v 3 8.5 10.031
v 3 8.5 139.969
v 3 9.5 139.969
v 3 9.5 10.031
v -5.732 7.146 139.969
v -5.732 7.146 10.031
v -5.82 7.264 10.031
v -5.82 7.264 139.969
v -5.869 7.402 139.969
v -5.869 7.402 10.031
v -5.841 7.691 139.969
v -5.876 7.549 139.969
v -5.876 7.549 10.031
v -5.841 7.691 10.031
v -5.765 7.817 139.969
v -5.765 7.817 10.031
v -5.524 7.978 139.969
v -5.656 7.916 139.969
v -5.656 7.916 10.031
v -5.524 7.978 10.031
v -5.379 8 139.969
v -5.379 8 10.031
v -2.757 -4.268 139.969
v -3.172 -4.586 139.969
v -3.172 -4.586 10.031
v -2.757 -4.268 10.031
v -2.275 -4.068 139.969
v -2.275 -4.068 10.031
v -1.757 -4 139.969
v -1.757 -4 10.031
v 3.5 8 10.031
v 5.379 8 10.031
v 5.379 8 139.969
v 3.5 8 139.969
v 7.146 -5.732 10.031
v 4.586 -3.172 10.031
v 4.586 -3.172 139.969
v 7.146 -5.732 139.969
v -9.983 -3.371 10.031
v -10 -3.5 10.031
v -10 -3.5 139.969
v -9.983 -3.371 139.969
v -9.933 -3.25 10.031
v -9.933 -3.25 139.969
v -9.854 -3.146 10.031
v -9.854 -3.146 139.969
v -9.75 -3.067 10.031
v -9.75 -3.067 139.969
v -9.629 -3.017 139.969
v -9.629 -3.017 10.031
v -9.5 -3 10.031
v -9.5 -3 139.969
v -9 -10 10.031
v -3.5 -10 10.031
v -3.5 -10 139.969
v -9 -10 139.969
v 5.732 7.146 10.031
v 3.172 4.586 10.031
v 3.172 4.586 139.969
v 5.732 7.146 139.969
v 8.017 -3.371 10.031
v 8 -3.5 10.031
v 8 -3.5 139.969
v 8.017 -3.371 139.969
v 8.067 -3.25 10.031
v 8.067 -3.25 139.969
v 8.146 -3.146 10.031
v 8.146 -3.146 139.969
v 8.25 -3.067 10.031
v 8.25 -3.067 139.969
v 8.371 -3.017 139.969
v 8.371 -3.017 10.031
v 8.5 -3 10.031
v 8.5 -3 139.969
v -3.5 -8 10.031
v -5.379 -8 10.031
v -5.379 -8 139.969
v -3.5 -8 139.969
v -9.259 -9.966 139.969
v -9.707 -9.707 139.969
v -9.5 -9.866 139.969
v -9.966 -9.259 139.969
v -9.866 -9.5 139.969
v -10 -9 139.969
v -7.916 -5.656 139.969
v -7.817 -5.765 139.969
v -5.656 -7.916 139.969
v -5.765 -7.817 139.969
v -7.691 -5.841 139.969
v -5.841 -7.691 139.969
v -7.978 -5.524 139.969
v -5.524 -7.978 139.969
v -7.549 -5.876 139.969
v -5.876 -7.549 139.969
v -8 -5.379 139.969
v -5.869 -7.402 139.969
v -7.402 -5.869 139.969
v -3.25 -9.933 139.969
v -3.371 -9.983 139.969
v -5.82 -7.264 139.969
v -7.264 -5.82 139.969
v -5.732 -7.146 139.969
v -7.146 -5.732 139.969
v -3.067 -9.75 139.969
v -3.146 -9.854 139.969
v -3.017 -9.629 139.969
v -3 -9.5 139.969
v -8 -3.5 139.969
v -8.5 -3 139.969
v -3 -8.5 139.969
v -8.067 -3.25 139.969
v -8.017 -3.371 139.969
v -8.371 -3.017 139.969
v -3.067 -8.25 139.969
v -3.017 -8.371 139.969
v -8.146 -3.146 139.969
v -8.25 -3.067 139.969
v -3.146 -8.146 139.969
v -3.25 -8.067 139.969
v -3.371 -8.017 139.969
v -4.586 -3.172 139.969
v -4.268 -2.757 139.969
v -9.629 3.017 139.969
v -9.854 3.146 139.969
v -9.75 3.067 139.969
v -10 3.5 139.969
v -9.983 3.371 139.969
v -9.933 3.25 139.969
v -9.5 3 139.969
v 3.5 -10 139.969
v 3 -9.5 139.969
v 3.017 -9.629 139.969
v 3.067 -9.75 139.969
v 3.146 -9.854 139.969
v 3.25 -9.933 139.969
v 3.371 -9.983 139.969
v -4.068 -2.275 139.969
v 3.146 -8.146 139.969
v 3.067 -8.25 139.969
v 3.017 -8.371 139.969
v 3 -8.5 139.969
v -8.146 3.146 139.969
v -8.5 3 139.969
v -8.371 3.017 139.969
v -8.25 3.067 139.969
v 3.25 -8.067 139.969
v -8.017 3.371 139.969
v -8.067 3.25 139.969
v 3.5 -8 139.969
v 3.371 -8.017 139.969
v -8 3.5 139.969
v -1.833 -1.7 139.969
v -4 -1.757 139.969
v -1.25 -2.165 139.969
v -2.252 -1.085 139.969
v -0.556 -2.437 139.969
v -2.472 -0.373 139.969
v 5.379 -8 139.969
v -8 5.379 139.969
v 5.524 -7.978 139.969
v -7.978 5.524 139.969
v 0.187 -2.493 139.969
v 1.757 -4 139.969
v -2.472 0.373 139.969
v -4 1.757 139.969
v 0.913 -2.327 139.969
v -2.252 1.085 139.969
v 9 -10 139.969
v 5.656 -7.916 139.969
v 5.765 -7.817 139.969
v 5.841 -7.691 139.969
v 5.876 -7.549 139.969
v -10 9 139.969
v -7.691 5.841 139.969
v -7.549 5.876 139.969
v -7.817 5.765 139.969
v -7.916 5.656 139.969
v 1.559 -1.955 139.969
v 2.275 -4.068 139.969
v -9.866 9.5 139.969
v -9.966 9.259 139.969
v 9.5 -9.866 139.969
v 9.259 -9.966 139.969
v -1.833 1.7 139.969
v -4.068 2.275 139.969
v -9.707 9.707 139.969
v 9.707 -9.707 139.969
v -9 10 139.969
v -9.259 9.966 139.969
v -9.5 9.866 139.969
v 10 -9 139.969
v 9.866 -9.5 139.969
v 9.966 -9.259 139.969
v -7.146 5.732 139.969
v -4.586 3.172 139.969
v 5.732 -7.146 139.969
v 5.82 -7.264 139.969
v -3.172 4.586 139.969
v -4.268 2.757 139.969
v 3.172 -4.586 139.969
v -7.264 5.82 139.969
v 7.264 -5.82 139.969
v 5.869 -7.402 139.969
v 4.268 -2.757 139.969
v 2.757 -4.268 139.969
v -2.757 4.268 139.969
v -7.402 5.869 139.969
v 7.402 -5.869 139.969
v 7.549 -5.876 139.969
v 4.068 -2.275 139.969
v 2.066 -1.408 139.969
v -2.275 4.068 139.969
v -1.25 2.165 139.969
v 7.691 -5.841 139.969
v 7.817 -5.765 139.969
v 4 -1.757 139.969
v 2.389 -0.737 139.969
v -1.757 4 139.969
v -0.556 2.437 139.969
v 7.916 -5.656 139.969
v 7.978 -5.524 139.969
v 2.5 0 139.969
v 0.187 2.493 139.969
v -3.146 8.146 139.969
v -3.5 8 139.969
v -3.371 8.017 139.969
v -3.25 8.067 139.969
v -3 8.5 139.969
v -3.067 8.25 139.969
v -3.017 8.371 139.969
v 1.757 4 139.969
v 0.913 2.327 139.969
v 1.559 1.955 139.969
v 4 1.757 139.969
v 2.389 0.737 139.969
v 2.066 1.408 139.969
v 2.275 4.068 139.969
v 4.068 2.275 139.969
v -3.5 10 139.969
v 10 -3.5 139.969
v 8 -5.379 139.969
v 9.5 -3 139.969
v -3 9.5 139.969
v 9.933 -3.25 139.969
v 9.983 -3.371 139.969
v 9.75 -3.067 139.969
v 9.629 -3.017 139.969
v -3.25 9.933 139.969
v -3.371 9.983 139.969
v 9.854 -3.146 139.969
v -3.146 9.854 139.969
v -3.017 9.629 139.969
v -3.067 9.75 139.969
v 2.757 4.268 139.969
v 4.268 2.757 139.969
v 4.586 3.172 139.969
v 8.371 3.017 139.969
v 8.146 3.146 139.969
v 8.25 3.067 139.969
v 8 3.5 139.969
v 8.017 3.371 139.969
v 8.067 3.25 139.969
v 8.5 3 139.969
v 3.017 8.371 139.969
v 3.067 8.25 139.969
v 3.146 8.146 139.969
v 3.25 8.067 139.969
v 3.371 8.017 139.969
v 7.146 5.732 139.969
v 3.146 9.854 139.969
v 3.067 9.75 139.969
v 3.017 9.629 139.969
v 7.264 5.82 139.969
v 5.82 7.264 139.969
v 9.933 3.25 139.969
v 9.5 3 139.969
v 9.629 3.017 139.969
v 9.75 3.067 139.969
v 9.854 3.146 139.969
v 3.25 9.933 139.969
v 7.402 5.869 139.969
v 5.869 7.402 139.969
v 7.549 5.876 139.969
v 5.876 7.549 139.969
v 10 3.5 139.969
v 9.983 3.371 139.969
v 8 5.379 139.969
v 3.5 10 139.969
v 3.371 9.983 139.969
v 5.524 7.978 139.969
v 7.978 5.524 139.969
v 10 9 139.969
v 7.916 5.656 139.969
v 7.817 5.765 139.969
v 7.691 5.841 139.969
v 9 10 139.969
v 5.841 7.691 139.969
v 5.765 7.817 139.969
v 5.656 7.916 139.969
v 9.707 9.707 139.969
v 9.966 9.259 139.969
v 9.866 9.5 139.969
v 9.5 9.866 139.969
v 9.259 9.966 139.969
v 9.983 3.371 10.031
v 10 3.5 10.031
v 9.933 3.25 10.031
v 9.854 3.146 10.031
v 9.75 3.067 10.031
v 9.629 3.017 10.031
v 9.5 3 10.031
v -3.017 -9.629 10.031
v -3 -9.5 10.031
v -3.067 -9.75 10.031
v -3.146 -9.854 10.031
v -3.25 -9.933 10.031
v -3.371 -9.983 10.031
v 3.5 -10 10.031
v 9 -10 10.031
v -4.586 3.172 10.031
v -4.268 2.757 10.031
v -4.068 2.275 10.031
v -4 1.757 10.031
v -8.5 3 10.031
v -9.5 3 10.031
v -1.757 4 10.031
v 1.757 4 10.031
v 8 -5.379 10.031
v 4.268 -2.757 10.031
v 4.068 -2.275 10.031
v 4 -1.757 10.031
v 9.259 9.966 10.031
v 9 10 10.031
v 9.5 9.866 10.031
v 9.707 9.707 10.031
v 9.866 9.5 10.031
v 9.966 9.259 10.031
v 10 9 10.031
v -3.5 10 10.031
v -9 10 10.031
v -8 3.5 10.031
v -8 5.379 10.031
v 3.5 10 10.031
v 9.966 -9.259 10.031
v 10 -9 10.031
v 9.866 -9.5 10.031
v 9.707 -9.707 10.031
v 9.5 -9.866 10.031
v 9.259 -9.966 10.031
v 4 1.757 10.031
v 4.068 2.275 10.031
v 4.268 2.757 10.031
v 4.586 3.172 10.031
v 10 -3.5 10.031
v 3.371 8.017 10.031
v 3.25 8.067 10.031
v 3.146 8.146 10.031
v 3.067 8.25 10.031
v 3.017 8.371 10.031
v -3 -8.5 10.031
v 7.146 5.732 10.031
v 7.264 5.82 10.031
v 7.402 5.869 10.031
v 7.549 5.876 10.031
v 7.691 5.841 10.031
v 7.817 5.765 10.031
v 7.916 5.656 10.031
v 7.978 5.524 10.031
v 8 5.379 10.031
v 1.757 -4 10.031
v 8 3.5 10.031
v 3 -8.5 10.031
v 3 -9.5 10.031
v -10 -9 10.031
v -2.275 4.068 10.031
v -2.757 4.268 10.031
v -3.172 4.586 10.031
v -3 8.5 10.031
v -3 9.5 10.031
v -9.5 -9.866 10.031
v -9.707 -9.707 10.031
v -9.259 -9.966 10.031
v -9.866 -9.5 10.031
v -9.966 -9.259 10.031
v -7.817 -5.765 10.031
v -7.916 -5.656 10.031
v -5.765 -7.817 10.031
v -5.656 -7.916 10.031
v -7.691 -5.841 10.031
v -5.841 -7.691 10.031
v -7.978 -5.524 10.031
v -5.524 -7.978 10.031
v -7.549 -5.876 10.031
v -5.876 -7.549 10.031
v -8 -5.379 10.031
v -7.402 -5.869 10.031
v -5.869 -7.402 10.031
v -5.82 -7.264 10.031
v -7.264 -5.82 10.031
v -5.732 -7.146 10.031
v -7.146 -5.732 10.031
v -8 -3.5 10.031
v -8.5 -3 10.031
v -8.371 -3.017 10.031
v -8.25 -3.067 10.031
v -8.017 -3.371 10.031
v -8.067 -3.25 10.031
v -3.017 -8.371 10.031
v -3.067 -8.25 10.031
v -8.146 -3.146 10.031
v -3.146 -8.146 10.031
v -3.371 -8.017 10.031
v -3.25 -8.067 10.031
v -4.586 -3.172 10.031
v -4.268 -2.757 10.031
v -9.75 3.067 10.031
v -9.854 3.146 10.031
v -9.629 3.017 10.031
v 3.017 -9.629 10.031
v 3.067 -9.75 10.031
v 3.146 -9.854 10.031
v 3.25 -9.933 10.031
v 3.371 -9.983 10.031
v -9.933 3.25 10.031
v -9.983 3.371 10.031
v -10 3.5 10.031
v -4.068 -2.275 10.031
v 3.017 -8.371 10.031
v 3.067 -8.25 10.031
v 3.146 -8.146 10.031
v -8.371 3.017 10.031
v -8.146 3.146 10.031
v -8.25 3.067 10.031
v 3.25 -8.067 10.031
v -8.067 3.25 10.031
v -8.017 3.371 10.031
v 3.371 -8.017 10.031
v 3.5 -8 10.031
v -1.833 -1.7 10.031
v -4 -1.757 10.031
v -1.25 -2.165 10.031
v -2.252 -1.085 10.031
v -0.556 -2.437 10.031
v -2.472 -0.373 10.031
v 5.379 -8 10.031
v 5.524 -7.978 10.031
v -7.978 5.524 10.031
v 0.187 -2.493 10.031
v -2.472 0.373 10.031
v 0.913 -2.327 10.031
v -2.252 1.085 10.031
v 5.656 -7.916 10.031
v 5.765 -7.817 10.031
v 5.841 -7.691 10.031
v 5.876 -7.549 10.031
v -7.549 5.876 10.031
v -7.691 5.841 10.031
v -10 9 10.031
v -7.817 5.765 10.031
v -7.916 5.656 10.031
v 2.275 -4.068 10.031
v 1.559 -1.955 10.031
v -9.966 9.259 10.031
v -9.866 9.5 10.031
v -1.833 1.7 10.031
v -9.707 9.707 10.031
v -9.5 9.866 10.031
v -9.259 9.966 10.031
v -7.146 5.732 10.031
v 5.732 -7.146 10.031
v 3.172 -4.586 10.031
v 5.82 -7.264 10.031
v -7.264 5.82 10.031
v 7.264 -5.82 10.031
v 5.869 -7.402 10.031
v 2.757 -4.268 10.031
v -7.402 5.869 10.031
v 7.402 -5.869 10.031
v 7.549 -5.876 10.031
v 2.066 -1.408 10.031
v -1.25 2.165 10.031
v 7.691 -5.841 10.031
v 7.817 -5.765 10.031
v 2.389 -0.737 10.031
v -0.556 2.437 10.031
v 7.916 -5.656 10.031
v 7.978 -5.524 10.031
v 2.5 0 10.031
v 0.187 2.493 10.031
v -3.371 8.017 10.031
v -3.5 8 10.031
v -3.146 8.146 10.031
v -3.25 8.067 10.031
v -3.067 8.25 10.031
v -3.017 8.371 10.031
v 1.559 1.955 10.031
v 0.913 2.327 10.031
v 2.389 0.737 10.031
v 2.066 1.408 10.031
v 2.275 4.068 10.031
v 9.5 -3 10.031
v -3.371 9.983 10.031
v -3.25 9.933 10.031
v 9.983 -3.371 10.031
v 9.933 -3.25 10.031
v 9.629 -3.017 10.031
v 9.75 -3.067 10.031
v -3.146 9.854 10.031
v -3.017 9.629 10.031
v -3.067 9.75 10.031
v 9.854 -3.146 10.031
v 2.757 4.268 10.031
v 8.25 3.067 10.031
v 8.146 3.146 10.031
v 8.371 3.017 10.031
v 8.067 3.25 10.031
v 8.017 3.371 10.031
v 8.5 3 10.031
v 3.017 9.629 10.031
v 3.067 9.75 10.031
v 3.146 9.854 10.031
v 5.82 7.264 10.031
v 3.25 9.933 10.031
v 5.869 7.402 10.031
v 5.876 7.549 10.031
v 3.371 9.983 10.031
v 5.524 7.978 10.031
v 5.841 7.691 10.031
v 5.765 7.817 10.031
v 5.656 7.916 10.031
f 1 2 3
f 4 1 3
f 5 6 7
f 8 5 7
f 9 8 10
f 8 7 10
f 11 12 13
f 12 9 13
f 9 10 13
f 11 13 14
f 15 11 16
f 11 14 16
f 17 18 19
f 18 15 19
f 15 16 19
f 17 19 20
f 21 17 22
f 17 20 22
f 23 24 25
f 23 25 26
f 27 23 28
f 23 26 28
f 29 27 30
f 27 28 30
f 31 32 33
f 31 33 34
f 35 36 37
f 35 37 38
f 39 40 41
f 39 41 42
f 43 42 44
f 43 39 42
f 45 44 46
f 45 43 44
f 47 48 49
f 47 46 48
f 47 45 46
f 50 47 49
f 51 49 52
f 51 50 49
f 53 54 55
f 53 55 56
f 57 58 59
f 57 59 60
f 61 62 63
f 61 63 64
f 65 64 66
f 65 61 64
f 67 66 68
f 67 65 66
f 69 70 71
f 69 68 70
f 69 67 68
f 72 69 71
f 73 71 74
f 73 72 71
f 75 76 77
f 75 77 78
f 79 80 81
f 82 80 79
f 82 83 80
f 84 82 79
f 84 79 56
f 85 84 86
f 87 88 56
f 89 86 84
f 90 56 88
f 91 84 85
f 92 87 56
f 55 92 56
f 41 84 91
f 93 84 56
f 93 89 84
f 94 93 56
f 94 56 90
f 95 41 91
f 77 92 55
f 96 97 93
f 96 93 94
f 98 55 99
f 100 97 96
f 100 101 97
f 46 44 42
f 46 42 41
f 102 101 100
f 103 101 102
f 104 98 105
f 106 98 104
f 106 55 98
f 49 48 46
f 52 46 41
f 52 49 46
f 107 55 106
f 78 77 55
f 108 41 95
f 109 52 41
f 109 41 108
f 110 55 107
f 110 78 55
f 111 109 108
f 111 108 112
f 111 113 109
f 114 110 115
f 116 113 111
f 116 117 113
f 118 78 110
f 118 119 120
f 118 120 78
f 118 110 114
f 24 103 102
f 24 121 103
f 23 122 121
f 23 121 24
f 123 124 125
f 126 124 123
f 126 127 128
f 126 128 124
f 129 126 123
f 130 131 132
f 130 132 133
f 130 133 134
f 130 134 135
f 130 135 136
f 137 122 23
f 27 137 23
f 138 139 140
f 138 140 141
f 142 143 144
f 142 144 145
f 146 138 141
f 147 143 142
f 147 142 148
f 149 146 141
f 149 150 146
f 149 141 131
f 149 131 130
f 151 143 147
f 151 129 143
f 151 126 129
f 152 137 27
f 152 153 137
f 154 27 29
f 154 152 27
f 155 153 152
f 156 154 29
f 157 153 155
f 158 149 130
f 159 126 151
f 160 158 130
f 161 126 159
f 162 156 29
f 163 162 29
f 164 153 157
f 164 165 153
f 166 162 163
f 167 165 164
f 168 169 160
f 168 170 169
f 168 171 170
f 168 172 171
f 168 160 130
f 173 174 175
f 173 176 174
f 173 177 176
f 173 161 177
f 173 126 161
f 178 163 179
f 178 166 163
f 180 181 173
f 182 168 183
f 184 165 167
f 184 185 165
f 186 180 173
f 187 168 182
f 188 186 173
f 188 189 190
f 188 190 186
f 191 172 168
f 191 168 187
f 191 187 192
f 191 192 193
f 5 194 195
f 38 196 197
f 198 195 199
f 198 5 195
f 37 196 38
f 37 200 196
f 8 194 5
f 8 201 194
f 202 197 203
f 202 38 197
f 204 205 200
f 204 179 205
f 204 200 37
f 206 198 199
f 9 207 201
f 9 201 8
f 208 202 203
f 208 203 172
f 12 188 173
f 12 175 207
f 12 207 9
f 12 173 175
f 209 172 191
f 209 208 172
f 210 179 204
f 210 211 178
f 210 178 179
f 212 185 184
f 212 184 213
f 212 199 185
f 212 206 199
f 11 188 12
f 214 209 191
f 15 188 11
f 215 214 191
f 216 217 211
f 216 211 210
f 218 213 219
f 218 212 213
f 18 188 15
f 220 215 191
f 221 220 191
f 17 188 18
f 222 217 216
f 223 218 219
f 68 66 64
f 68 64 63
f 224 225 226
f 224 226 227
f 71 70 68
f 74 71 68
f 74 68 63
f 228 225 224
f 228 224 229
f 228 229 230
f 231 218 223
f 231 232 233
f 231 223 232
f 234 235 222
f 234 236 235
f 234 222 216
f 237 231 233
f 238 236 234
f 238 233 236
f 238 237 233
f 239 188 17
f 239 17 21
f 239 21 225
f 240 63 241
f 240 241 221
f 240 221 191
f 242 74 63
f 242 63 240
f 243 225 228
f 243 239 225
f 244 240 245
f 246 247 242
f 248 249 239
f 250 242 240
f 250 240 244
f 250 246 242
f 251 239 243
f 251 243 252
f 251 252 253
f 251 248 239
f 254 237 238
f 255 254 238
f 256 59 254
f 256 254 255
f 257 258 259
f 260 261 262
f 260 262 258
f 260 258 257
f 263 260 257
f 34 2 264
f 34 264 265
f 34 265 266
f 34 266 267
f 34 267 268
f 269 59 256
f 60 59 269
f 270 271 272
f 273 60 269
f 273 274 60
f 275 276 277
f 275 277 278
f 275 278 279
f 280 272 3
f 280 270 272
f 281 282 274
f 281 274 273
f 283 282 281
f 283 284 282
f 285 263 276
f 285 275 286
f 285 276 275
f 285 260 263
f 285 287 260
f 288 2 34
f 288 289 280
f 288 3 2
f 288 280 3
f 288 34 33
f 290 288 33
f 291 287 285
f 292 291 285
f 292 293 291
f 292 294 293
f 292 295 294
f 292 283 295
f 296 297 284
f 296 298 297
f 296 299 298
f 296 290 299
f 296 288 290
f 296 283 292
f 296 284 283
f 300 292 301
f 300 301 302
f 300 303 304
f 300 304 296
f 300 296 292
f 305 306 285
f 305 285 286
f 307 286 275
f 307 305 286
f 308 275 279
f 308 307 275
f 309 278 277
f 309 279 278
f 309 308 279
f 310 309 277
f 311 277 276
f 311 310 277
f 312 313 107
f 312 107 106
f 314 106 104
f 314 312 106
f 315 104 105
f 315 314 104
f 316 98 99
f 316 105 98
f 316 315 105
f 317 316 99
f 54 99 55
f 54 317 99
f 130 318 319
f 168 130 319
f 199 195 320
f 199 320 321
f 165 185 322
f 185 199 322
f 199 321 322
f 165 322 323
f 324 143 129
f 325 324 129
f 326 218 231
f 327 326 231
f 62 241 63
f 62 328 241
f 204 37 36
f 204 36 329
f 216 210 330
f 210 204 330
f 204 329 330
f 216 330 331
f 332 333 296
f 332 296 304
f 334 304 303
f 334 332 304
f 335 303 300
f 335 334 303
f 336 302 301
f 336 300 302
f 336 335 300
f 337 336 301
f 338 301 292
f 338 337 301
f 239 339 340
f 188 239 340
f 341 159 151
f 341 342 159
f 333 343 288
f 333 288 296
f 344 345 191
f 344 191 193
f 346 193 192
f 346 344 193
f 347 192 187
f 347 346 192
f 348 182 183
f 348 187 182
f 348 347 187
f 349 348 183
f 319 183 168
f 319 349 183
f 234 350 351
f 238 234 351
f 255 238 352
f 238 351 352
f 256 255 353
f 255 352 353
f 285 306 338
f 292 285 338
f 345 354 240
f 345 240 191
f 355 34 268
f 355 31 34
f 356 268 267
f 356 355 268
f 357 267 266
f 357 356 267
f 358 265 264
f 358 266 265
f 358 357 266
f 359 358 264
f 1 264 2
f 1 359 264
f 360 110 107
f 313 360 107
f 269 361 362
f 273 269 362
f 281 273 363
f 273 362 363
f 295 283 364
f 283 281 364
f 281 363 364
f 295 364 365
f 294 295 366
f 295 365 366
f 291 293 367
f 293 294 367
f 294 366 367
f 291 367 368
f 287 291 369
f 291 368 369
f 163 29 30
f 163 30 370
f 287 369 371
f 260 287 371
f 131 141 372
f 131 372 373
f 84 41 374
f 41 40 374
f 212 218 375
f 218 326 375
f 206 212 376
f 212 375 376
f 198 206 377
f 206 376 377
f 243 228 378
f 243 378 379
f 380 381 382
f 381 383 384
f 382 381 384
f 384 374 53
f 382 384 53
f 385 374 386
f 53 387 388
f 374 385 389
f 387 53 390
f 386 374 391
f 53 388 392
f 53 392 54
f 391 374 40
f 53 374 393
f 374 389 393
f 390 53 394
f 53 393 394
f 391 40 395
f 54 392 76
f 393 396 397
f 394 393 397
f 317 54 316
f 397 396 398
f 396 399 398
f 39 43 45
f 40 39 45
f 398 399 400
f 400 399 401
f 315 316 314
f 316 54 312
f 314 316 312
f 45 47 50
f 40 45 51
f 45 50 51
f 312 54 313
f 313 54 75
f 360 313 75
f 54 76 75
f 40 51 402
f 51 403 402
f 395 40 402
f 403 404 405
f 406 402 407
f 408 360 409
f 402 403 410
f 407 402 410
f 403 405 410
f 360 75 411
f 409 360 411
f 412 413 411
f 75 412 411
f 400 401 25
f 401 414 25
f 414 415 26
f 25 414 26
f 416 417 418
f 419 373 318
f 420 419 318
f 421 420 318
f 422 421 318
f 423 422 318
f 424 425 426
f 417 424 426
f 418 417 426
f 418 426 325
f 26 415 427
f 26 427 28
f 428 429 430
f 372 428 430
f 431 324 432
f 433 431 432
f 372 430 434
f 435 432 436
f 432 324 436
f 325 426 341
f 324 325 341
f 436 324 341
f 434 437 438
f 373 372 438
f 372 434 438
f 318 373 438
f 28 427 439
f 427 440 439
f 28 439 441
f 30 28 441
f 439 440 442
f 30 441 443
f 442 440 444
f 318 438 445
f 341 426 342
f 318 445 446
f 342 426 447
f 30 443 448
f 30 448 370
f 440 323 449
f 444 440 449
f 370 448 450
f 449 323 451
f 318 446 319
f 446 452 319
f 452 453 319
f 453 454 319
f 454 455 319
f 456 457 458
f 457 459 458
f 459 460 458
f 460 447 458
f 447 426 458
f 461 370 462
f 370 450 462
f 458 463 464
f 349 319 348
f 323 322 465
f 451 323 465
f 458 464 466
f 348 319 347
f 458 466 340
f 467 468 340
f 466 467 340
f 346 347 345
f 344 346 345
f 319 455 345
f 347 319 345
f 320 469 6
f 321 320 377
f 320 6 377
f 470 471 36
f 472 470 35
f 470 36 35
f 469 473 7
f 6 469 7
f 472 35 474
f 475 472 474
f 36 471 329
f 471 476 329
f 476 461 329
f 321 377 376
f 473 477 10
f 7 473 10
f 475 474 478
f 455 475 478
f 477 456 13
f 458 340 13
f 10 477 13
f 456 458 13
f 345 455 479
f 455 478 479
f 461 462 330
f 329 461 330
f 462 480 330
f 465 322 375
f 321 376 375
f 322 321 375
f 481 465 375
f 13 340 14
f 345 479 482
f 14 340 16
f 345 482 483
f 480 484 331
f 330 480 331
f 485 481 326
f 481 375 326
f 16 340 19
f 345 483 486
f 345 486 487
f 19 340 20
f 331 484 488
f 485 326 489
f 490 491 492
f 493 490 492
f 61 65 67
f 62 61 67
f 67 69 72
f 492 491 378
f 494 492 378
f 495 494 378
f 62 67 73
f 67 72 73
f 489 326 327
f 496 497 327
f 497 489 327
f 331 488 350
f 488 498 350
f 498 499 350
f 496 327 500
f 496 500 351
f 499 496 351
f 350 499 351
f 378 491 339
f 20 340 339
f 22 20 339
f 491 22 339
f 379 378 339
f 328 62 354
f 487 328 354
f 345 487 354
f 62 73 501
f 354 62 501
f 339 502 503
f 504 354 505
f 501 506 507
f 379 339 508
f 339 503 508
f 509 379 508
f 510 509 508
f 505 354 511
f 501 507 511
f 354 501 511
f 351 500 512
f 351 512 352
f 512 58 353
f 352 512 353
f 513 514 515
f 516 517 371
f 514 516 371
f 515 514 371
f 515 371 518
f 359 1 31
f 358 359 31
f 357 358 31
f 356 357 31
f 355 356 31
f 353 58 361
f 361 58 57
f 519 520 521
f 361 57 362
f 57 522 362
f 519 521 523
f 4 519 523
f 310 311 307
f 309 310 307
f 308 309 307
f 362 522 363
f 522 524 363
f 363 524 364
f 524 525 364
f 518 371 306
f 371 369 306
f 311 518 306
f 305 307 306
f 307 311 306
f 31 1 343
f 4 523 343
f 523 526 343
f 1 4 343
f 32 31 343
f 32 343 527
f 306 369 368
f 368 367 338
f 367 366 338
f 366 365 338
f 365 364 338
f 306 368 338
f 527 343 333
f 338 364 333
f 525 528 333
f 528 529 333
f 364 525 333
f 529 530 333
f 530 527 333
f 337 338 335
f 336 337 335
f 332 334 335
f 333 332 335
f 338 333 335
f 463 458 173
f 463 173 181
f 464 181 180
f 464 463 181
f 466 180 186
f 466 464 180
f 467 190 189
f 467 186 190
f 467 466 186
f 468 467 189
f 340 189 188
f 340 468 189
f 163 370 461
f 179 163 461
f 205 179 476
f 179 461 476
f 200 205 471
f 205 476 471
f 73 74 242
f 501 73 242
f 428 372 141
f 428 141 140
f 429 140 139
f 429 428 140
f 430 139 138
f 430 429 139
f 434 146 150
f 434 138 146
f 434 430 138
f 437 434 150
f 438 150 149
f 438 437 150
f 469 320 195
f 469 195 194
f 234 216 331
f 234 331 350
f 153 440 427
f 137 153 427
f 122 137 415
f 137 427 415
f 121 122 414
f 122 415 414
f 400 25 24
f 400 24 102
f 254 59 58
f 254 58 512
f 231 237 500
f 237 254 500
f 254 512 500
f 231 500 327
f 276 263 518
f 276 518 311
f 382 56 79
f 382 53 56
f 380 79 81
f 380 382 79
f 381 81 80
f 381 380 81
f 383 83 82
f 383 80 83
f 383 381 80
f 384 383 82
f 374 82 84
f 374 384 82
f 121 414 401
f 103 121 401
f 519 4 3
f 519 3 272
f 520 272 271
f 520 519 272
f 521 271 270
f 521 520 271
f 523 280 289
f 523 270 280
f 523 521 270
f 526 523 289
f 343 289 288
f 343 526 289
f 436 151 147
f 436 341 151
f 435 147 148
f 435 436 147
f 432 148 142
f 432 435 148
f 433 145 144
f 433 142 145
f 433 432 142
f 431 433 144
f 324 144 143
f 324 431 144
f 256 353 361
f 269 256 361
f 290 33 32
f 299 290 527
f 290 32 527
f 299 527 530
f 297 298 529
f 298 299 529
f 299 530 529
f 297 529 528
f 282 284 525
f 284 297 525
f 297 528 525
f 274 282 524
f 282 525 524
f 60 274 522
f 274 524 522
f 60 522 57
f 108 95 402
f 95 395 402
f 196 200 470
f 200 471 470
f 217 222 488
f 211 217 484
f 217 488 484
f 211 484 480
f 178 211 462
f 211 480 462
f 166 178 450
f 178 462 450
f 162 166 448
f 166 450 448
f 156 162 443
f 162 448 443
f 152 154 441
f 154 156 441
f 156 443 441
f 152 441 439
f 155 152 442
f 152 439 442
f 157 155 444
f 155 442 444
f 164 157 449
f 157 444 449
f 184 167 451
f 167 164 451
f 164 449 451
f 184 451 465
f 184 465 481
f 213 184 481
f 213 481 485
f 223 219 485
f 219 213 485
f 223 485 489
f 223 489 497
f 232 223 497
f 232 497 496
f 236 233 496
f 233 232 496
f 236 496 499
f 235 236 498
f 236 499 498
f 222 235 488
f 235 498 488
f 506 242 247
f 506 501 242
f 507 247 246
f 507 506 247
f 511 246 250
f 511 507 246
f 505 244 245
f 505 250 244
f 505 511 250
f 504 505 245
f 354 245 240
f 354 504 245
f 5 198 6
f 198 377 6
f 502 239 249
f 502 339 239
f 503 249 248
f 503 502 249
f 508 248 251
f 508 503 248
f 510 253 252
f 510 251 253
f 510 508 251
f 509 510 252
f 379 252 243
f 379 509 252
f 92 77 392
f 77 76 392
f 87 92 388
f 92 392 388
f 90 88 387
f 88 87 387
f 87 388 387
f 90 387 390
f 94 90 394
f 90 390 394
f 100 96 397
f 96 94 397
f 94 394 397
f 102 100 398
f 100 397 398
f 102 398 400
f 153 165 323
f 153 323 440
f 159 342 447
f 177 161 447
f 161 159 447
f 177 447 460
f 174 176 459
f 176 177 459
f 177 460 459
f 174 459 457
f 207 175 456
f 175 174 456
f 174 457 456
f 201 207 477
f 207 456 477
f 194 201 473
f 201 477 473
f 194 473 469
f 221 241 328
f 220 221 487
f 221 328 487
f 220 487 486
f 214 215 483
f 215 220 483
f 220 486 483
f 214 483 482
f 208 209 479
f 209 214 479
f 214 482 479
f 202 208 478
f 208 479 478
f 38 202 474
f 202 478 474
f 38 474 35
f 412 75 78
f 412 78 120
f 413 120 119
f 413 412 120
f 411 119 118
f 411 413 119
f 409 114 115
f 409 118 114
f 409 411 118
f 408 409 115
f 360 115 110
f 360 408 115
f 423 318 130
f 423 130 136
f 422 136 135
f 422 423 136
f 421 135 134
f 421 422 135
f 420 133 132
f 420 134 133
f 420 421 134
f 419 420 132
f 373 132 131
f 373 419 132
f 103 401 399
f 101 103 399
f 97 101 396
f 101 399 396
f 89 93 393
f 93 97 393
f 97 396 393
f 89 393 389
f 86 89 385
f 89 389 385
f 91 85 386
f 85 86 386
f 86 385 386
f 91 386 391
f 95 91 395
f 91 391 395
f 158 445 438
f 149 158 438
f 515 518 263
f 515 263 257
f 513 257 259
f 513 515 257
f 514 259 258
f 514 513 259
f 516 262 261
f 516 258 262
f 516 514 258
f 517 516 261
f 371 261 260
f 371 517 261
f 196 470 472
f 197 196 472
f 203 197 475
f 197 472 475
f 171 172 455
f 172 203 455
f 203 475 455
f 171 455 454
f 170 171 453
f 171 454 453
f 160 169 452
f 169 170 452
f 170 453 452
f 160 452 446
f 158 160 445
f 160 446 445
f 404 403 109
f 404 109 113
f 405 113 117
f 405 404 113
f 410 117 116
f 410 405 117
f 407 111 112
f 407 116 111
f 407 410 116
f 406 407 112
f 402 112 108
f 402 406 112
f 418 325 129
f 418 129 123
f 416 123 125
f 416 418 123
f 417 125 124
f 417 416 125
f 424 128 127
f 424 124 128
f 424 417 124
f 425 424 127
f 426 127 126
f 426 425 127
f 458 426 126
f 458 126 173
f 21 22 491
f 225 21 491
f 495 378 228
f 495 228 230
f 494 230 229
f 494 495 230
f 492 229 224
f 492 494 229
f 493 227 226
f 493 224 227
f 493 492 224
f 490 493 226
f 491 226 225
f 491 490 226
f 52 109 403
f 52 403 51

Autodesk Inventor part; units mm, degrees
ref_plane "Start Plane" through (0, 0, 10.031) normal (0, 0, 1) x (1, 0, 0)
ref_plane "End Plane" through (0, 0, 139.969) normal (0, 0, 1) x (1, 0, 0)
sketch "Sketch" plane through (0, 0, 0) normal (0, 0, 1) x (1, 0, 0)
  line L0 (0, 0) -> (2.5, 0) construction
  line L1 (0, 0) -> (0, 2.5) construction
  line L2 (0, 4) -> (0, -4) construction
  line L3 (0, 4) -> (1.7574, 4)
  arc A0 (1.7574, 4) -> (3.1716, 4.5858) centre (1.7574, 6) ccw
  line L4 (3.1716, 4.5858) -> (5.7322, 7.1464)
  line L5 (-4, 0) -> (4, 0) construction
  line L6 (4, 0) -> (4, 1.7574)
  arc A1 (4.5858, 3.1716) -> (4, 1.7574) centre (6, 1.7574) ccw
  line L7 (4.5858, 3.1716) -> (7.1464, 5.7322)
  line L8 (0, 0) -> (10, 10) construction
  line L9 (0, 0) -> (19.6827, 0) construction
  arc A2 (8, 5.3787) -> (7.1464, 5.7322) centre (7.5, 5.3787) ccw
  line L10 (8, 5.3787) -> (8, 3.5)
  arc A3 (8, 3.5) -> (8.5, 3) centre (8.5, 3.5) ccw
  line L11 (8.5, 3) -> (9.5, 3)
  arc A4 (9.5, 3) -> (10, 3.5) centre (9.5, 3.5) ccw
  line L12 (10, 3.5) -> (10, 9)
  line L13 (10, 9) -> (10, 10) construction
  arc A5 (5.7322, 7.1464) -> (5.3787, 8) centre (5.3787, 7.5) ccw
  line L14 (5.3787, 8) -> (3.5, 8)
  arc A6 (3, 8.5) -> (3.5, 8) centre (3.5, 8.5) ccw
  line L15 (3, 8.5) -> (3, 9.5)
  arc A7 (3.5, 10) -> (3, 9.5) centre (3.5, 9.5) ccw
  line L16 (3.5, 10) -> (9, 10)
  arc A8 (10, 9) -> (9, 10) centre (9, 9) ccw
  line L17 (0, 4) -> (-1.7574, 4)
  arc A9 (-3.1716, 4.5858) -> (-1.7574, 4) centre (-1.7574, 6) ccw
  line L18 (-3.1716, 4.5858) -> (-5.7322, 7.1464)
  line L19 (-4, 0) -> (-4, 1.7574)
  arc A10 (-4, 1.7574) -> (-4.5858, 3.1716) centre (-6, 1.7574) ccw
  line L20 (-4.5858, 3.1716) -> (-7.1464, 5.7322)
  arc A11 (-7.1464, 5.7322) -> (-8, 5.3787) centre (-7.5, 5.3787) ccw
  line L21 (-8, 5.3787) -> (-8, 3.5)
  arc A12 (-8.5, 3) -> (-8, 3.5) centre (-8.5, 3.5) ccw
  line L22 (-8.5, 3) -> (-9.5, 3)
  arc A13 (-10, 3.5) -> (-9.5, 3) centre (-9.5, 3.5) ccw
  line L23 (-10, 3.5) -> (-10, 9)
  arc A14 (-5.3787, 8) -> (-5.7322, 7.1464) centre (-5.3787, 7.5) ccw
  line L24 (-5.3787, 8) -> (-3.5, 8)
  arc A15 (-3.5, 8) -> (-3, 8.5) centre (-3.5, 8.5) ccw
  line L25 (-3, 8.5) -> (-3, 9.5)
  arc A16 (-3, 9.5) -> (-3.5, 10) centre (-3.5, 9.5) ccw
  line L26 (-3.5, 10) -> (-9, 10)
  arc A17 (-9, 10) -> (-10, 9) centre (-9, 9) ccw
  line L27 (0, -4) -> (-1.7574, -4)
  arc A18 (-1.7574, -4) -> (-3.1716, -4.5858) centre (-1.7574, -6) ccw
  line L28 (-3.1716, -4.5858) -> (-5.7322, -7.1464)
  arc A19 (-5.7322, -7.1464) -> (-5.3787, -8) centre (-5.3787, -7.5) ccw
  line L29 (-5.3787, -8) -> (-3.5, -8)
  arc A20 (-3, -8.5) -> (-3.5, -8) centre (-3.5, -8.5) ccw
  line L30 (-3, -8.5) -> (-3, -9.5)
  arc A21 (-3.5, -10) -> (-3, -9.5) centre (-3.5, -9.5) ccw
  line L31 (-3.5, -10) -> (-9, -10)
  arc A22 (-10, -9) -> (-9, -10) centre (-9, -9) ccw
  line L32 (-10, -3.5) -> (-10, -9)
  arc A23 (-9.5, -3) -> (-10, -3.5) centre (-9.5, -3.5) ccw
  line L33 (-8.5, -3) -> (-9.5, -3)
  arc A24 (-8, -3.5) -> (-8.5, -3) centre (-8.5, -3.5) ccw
  line L34 (-8, -5.3787) -> (-8, -3.5)
  arc A25 (-8, -5.3787) -> (-7.1464, -5.7322) centre (-7.5, -5.3787) ccw
  line L35 (-4.5858, -3.1716) -> (-7.1464, -5.7322)
  arc A26 (-4.5858, -3.1716) -> (-4, -1.7574) centre (-6, -1.7574) ccw
  line L36 (-4, 0) -> (-4, -1.7574)
  line L37 (3.5, -10) -> (9, -10)
  arc A27 (9, -10) -> (10, -9) centre (9, -9) ccw
  line L38 (10, -3.5) -> (10, -9)
  arc A28 (10, -3.5) -> (9.5, -3) centre (9.5, -3.5) ccw
  line L39 (8.5, -3) -> (9.5, -3)
  arc A29 (8.5, -3) -> (8, -3.5) centre (8.5, -3.5) ccw
  line L40 (8, -5.3787) -> (8, -3.5)
  arc A30 (7.1464, -5.7322) -> (8, -5.3787) centre (7.5, -5.3787) ccw
  line L41 (4.5858, -3.1716) -> (7.1464, -5.7322)
  arc A31 (4, -1.7574) -> (4.5858, -3.1716) centre (6, -1.7574) ccw
  line L42 (4, 0) -> (4, -1.7574)
  line L43 (5.3787, -8) -> (3.5, -8)
  arc A32 (5.3787, -8) -> (5.7322, -7.1464) centre (5.3787, -7.5) ccw
  line L44 (3.1716, -4.5858) -> (5.7322, -7.1464)
  arc A33 (3.1716, -4.5858) -> (1.7574, -4) centre (1.7574, -6) ccw
  line L45 (0, -4) -> (1.7574, -4)
  arc A34 (3.5, -8) -> (3, -8.5) centre (3.5, -8.5) ccw
  line L46 (3, -8.5) -> (3, -9.5)
  arc A35 (3, -9.5) -> (3.5, -10) centre (3.5, -9.5) ccw
  circle A36 centre (0, 0) radius 2.5
  dimension "d1" = 8
  dimension "d2" = 2
  dimension "d3" = 8
  dimension "d4" = 2
  dimension "d5" = 2
  dimension "d7" = 45
  dimension "d8" = 0.5
  dimension "d9" = 0.5
  dimension "d10" = 0.5
  dimension "d12" = 2
  dimension "d17" = 7
  dimension "d18" = 10
  dimension "d19" = 0.5
  dimension "d20" = 1
  dimension "d21" = 0.5
  dimension "d22" = 0.5
  dimension "d23" = 2
  dimension "d24" = 7
  dimension "d25" = 5
extrude "Body" add sketch "Sketch" along normal up to surface (129.938 mm away) from surface at 10.031
sketch "Sketch6" plane through (0, 0, 0) normal (0, 0, 1) x (1, 0, 0)
  line L0 (0, 0) -> (10, 0)
ref_plane "Work Plane5" through (0, 0, 0) normal (0, -1, 0) x (1, 0, 0)
sketch "Sketch7" plane through (0, 0, 0) normal (0, -1, 0) x (1, 0, 0)
  line L0 (-2, 10.031) -> (12, 10.031)
  line L1 (-2, 139.969) -> (12, 139.969)
  dimension "d33" = 129.938
ref_plane "Work Plane6" through (-500, 9, 10.031) normal (0, 0, -1) x (-1, 0, 0)
split "Split1" plane through (-500, 9, 10.031) removes the side toward (0, 0, -1)
ref_plane "Work Plane7" through (0, 9, 139.969) normal (0, 0, 1) x (1, 0, 0)
split "Split2" plane through (0, 9, 139.969) removes the side toward (0, 0, 1)
ref_plane "Work Plane8" through (-500, 0, 10.031) normal (0, 0, -1) x (-1, 0, 0)
split "Split3" plane through (-500, 0, 10.031) removes the side toward (0, 0, -1)
ref_plane "Work Plane9" through (0, 0, 139.969) normal (0, 0, 1) x (1, 0, 0)
split "Split4" plane through (0, 0, 139.969) removes the side toward (0, 0, 1)
equation "\"d1\" = 8 * sigma"
equation "\"d2\" = 2 * sigma"
equation "\"d3\" = 8 * sigma"
equation "\"d4\" = 2 * sigma"
equation "\"d5\" = 2 * sigma"
equation "\"d8\" = 0.5 * sigma"
equation "\"d9\" = 0.5 * sigma"
equation "\"d10\" = 0.5 * sigma"
equation "\"d12\" = 2 * sigma"
equation "\"d17\" = 7 * sigma"
equation "\"d18\" = sigma"
equation "\"d19\" = 0.5 * sigma"
equation "\"d20\" = sigma"
equation "\"d21\" = 0.5 * sigma"
equation "\"d22\" = 0.5 * sigma"
equation "\"d23\" = 2 * sigma"
equation "\"d24\" = 7 * sigma"
equation "\"d25\" = 5 * sigma"
equation "\"sigma\" = 1"
equation "\"G_OFFSET_START\" = -10.031"
equation "\"G_OFFSET_END\" = -10.031"
equation "\"d28\" = -G_OFFSET_START"
equation "\"d29\" = Length + G_OFFSET_END"
equation "\"G_L\" = d33"
equation "\"Length\" = 150"
properties part number "A3.3-MEM"
